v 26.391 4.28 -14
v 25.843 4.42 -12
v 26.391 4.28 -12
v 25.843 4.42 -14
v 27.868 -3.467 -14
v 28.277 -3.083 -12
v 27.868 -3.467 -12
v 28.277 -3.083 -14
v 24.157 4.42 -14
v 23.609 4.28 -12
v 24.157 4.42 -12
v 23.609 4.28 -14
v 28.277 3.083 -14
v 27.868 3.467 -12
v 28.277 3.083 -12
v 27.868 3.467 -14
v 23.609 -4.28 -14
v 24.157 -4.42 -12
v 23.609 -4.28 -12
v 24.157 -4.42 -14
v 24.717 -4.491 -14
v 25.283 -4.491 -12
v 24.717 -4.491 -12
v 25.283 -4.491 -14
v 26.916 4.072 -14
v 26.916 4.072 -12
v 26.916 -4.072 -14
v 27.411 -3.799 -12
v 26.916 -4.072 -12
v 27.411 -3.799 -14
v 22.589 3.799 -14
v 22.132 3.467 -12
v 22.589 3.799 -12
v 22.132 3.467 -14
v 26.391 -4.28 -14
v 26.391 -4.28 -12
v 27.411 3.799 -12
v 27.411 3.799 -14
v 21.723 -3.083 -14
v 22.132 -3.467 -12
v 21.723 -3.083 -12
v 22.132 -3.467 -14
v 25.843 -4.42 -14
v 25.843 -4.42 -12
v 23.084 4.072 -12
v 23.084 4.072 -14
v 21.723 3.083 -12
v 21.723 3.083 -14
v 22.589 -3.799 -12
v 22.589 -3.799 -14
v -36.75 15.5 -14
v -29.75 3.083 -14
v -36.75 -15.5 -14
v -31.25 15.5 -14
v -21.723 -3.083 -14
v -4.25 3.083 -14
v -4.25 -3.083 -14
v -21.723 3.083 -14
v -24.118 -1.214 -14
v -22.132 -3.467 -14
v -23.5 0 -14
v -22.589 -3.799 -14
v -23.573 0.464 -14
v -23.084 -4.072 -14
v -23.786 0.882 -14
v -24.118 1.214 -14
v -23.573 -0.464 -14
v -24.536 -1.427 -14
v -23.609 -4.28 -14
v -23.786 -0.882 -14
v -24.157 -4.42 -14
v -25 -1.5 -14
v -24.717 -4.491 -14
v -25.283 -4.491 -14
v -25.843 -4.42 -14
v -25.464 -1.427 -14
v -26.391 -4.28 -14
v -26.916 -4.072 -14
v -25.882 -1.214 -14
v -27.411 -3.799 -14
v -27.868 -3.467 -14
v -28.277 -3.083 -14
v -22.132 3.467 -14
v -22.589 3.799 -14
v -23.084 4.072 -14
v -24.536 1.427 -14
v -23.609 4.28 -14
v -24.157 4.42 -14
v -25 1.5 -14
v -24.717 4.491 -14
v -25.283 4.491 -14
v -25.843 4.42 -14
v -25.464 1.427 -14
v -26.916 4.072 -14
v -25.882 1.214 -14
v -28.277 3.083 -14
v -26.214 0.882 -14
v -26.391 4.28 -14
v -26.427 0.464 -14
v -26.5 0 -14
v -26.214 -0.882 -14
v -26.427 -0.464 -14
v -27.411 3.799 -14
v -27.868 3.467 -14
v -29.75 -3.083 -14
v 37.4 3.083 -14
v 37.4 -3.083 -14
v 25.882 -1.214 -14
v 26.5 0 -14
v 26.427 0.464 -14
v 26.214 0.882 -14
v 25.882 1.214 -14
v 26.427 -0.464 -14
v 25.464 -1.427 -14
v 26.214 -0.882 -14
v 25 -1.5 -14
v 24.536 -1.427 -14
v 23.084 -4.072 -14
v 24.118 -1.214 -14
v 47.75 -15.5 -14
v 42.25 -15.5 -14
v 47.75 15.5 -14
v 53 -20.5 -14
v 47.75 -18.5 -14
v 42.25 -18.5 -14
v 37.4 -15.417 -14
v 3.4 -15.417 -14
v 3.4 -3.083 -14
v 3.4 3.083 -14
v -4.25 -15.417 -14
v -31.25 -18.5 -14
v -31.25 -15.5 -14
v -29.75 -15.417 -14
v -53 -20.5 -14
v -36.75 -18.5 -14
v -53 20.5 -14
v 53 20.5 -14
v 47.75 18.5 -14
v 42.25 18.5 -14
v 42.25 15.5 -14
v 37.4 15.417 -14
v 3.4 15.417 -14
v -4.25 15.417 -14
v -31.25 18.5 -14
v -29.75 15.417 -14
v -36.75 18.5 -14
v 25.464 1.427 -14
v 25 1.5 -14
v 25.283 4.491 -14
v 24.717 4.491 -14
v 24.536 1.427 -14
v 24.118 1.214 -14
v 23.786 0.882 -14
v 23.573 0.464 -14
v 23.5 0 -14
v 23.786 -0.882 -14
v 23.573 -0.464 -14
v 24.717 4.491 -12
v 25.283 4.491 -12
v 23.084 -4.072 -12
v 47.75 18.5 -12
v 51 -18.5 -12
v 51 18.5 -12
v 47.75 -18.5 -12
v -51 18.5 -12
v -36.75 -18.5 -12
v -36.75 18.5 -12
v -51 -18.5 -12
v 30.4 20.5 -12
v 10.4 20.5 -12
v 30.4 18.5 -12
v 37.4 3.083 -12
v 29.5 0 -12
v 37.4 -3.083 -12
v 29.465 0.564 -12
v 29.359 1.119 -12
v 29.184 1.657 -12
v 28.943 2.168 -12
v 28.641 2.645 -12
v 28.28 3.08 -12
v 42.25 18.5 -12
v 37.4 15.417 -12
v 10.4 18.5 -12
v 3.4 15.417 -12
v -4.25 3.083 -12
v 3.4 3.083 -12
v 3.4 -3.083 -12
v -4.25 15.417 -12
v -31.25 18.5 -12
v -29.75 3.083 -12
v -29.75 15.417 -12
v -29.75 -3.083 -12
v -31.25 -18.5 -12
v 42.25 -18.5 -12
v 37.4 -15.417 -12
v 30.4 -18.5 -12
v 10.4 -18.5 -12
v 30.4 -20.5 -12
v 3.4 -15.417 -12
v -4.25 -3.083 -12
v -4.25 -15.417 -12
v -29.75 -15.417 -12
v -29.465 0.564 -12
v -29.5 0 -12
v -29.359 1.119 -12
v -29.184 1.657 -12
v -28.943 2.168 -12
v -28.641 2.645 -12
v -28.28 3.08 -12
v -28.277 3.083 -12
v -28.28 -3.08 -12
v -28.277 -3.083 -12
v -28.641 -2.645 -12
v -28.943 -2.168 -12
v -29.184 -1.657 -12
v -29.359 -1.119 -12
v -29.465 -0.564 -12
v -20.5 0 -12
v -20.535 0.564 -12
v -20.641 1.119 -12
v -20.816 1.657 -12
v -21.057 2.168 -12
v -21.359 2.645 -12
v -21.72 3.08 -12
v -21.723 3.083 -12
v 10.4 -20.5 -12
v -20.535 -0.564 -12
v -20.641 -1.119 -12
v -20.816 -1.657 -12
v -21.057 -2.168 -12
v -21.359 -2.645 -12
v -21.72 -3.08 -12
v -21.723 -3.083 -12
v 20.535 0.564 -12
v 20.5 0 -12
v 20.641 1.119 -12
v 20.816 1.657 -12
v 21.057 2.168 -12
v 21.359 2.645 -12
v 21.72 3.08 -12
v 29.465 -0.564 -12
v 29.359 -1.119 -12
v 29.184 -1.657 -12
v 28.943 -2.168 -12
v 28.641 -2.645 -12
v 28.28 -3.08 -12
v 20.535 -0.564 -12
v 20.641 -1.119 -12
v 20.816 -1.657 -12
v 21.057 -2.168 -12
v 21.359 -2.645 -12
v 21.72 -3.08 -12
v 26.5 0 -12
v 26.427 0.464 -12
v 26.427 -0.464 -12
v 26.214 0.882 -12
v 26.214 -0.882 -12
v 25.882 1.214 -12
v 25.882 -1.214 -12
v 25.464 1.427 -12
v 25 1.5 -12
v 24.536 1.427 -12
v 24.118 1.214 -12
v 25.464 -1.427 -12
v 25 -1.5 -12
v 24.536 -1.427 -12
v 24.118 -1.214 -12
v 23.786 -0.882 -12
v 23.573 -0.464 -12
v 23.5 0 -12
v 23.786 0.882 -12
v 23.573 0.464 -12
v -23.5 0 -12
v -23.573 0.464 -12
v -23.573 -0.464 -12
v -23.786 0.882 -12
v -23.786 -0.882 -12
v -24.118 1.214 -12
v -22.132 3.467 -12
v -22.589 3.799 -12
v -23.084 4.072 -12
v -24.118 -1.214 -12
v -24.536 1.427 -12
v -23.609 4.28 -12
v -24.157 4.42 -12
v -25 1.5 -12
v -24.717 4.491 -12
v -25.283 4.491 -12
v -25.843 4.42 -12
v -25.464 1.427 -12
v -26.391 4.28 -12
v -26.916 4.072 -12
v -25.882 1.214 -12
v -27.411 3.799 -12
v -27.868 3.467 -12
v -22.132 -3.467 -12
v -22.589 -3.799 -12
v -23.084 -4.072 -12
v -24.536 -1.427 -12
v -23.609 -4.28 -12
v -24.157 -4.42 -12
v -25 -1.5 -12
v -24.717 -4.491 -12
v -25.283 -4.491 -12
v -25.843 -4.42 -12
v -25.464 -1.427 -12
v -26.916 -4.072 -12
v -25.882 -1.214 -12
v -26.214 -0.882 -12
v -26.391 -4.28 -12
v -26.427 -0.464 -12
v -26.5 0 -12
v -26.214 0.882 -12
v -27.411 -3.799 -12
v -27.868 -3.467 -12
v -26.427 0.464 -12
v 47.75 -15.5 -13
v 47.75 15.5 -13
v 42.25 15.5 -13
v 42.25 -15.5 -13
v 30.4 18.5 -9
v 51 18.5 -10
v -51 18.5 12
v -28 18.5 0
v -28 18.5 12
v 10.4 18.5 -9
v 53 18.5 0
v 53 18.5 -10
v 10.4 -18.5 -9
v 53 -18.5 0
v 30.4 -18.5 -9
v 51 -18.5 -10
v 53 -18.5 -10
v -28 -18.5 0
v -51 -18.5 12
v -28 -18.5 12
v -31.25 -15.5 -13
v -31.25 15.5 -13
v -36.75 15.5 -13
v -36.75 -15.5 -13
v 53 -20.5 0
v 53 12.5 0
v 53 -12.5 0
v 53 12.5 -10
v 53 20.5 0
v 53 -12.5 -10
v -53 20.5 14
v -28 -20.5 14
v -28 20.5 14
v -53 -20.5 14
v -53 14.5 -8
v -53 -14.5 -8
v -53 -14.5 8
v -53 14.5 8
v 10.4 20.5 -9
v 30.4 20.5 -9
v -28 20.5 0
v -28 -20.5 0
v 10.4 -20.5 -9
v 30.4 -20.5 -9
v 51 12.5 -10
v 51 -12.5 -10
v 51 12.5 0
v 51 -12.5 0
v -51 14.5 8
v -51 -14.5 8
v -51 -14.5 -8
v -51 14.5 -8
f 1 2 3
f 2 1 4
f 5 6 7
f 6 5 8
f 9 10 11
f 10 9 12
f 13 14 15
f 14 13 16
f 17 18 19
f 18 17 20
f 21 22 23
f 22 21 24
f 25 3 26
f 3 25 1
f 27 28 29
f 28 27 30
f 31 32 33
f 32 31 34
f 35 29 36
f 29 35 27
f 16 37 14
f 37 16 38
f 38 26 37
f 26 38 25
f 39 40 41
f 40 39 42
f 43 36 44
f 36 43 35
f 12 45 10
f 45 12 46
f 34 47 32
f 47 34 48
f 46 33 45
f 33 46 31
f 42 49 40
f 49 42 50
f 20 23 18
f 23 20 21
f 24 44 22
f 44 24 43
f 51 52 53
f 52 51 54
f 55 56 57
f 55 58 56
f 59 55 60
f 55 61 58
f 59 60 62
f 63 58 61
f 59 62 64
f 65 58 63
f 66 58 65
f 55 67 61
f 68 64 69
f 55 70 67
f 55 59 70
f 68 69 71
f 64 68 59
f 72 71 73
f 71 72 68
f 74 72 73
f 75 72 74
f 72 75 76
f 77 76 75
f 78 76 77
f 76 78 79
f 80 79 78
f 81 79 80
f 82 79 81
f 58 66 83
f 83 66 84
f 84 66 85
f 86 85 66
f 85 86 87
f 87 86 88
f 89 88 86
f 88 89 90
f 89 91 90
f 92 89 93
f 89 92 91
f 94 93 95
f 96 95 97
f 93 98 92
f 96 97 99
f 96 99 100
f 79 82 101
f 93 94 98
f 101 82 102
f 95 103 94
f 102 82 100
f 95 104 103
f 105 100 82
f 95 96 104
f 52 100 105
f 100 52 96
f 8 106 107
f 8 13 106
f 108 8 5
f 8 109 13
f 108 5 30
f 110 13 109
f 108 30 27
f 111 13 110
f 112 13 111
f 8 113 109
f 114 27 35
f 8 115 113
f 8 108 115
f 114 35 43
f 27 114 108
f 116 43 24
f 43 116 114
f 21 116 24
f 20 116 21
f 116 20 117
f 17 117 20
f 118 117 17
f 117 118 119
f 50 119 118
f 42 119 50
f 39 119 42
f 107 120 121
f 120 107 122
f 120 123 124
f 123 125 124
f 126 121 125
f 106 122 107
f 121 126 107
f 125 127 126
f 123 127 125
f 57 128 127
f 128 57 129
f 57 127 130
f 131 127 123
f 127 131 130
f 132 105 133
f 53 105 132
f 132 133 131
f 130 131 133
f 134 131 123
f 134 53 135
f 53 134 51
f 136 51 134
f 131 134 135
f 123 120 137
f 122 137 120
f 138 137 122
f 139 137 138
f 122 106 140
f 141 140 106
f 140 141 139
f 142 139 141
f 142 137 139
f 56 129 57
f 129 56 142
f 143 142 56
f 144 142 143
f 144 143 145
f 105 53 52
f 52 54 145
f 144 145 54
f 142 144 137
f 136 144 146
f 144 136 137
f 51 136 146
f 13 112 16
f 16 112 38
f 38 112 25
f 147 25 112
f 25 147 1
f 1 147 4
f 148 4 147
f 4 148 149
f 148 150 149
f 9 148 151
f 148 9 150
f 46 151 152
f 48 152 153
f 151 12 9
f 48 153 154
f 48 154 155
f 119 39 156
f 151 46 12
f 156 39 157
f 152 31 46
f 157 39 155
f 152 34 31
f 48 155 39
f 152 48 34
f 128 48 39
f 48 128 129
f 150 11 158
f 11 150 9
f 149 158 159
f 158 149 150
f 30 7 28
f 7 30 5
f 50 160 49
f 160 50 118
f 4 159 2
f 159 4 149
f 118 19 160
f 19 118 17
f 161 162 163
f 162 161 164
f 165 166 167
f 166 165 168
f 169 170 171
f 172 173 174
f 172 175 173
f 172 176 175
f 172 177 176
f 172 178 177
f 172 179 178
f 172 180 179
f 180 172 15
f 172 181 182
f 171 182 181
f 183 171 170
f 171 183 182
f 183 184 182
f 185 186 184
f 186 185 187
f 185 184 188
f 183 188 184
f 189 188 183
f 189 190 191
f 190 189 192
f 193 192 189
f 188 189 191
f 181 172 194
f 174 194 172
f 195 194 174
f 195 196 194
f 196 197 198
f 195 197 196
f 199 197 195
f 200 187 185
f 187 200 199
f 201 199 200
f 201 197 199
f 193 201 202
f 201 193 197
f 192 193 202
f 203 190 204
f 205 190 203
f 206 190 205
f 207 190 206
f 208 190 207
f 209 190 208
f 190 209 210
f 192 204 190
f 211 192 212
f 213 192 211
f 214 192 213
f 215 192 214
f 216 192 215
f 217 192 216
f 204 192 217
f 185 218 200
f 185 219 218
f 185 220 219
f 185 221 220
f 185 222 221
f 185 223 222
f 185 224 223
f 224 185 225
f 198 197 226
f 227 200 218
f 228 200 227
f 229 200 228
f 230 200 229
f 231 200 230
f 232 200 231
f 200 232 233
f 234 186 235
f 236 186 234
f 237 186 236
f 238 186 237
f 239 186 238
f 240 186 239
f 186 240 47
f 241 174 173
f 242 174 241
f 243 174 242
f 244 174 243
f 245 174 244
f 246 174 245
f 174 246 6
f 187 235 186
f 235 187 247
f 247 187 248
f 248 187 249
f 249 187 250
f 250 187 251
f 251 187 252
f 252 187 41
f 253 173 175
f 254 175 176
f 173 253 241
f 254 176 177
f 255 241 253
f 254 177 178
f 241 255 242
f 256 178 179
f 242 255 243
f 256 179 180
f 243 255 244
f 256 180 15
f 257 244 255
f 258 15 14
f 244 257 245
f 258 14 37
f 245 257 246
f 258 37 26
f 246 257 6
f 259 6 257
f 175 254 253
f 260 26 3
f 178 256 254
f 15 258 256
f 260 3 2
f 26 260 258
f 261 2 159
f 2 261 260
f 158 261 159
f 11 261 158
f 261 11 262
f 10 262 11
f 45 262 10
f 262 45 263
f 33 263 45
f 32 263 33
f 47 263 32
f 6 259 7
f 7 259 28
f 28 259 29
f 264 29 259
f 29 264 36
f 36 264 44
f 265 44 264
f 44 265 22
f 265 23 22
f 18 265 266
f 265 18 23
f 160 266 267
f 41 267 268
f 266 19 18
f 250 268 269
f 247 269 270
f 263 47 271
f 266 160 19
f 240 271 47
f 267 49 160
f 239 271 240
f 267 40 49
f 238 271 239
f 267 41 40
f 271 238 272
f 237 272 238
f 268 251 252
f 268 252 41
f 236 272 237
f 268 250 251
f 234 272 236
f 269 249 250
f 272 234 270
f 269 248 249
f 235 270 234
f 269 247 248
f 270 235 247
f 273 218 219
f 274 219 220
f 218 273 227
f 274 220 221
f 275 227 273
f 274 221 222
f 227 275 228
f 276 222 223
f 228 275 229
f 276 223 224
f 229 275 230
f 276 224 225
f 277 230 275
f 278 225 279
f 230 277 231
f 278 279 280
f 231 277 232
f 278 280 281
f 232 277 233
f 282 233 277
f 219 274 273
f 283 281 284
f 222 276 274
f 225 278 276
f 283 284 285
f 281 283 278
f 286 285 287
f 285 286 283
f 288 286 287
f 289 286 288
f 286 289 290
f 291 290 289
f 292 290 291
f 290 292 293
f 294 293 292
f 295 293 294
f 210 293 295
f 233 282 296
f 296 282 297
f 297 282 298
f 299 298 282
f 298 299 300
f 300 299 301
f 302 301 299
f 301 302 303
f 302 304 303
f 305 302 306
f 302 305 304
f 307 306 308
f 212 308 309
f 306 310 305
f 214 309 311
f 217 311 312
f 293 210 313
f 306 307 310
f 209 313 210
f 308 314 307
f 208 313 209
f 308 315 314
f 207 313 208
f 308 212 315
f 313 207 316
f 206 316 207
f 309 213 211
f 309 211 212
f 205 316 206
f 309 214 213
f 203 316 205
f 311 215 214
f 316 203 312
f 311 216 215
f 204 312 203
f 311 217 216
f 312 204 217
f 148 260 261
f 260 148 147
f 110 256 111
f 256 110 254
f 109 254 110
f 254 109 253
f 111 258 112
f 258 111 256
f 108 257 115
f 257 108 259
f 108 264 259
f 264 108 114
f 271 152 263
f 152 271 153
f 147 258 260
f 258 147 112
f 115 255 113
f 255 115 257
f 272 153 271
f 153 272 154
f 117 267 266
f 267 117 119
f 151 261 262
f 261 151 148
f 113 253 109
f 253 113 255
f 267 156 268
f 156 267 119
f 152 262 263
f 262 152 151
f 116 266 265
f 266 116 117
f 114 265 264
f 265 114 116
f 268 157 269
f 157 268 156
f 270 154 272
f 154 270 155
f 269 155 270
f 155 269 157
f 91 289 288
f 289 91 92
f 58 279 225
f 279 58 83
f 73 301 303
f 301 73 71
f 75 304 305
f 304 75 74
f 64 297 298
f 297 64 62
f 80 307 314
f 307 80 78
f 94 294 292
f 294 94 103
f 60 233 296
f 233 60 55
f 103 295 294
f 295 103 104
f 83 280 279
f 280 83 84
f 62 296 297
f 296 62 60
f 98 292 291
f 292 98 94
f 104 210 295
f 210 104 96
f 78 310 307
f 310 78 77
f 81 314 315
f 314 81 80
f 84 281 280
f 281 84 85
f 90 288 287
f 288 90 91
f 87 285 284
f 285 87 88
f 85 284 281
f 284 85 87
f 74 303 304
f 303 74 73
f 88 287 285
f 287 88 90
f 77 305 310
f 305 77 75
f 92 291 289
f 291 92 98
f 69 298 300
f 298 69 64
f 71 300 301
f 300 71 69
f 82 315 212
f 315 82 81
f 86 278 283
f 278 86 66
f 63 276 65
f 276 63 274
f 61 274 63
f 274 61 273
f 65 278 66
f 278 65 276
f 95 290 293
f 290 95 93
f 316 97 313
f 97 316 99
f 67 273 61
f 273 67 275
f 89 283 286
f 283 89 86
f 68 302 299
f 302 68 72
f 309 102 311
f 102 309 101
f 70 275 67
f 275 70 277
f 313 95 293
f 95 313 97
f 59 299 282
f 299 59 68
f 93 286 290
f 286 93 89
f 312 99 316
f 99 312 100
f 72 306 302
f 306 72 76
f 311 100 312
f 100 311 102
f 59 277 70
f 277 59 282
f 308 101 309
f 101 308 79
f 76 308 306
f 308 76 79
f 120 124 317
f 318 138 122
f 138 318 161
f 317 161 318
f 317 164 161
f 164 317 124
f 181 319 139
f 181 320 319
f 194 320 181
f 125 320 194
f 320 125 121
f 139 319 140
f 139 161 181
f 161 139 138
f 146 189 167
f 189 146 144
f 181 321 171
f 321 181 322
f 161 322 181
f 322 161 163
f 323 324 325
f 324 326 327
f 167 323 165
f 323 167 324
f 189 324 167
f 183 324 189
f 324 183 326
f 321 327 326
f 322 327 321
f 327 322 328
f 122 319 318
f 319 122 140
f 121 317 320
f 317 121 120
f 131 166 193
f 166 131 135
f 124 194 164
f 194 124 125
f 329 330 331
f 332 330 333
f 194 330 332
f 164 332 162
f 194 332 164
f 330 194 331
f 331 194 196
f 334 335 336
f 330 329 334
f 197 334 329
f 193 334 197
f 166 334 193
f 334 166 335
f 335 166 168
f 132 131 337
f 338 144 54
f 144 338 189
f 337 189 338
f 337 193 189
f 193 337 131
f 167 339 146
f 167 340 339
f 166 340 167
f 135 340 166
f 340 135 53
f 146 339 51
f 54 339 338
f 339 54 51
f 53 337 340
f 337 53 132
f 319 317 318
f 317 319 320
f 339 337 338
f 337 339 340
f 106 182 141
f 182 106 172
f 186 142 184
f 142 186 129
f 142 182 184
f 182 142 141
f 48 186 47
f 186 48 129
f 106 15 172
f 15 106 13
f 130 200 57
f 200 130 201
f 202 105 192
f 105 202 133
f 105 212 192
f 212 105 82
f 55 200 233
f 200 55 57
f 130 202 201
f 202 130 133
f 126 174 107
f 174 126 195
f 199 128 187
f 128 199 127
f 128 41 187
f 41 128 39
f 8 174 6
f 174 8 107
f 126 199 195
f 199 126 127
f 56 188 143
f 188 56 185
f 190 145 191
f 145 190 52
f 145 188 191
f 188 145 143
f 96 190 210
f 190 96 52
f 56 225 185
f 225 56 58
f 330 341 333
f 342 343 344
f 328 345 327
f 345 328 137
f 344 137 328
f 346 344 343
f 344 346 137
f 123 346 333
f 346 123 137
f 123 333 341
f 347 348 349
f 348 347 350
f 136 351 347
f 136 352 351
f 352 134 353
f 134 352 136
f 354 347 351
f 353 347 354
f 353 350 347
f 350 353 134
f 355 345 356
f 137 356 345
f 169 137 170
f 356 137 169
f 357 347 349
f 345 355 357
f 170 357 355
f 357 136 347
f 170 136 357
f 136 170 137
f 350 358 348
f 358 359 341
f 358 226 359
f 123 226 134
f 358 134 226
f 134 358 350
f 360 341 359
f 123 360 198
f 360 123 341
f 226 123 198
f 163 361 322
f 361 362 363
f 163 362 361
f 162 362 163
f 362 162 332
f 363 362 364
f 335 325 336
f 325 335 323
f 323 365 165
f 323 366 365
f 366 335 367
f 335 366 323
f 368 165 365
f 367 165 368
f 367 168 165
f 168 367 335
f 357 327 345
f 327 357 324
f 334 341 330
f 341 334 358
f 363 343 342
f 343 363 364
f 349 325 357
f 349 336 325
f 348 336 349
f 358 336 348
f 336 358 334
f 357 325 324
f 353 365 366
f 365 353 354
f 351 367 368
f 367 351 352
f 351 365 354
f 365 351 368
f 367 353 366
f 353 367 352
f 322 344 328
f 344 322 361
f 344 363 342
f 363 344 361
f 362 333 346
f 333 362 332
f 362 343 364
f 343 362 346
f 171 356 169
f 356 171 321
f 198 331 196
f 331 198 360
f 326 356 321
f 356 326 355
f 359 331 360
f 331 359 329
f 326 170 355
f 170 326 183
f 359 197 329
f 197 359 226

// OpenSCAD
battery_length=102;
battery_height=24;
battery_width=37;
// high is not be tested it can be it will not fit in!
wall_height=2; // [3:low,2:medium,1.5:!high!]
thickness=2; // [1:3]
hole= 3; // [0:8]
sunk_screws=0; // [0:NO, 1:YES]
// set this to 0 for one hole.
hole_distance=50;
light=1; // [0:NO, 1:YES]
cable_tie_hole=1;// [0:NO, 1:YES]
band_hole=1; // [0:NO, 1:YES]
thick_edge=0; // [0:NO, 1:YES]
//This will only disable wall height and band hole!
hard_case=0; // [0:NO, 1:YES]

module Akku(){
cube([battery_length,battery_width,battery_height],center=true);
}


module Case(L,B,H)
{
difference(){
cube([L,B,H],center=true);
Akku();

if (hard_case==0)
{
if(battery_length > 100)
{
translate([25,0,thickness+battery_height/wall_height]){
cube([L,B+0.5,H],center=true);
}
} else {
translate([battery_length/4,0,thickness+battery_height/wall_height]){
cube([L,B+0.5,H],center=true);
}
}
}

if(light==1)
{
translate([-L/2,0,0])
{
cube([L,battery_width-thickness*4,battery_height-thickness*4],center=true);
}
}



if (hard_case==1)
{
translate([L/2,0,0])
{
cube([L,battery_width,battery_height],center=true);
}
}
translate([L/2,battery_width/2-thickness*1.5,0])
{
cube([L,thickness*3,battery_height-thickness*2],center=true);
}
translate([L/2,-battery_width/2+thickness*1.5,0])
{
cube([L,thickness*3,battery_height-thickness*2],center=true);
}



if(cable_tie_hole==1)
{
translate([battery_length/2-thickness*3,battery_width/2-1.5,-battery_height/2-0.1])
{
cube([5.5,3,thickness*2],center=true);
}
translate([battery_length/2-thickness*3,-battery_width/2+1.5,-battery_height/2-0.1])
{
cube([5.5,3,thickness*2],center=true);
}
translate([-battery_length/3,battery_width/2-1.5,-battery_height/2-0.1])
{
cube([5.5,3,thickness*2],center=true);
}
translate([-battery_length/3,-battery_width/2+1.5,-battery_height/2-0.1])
{
cube([5.5,3,thickness*2],center=true);
}

translate([battery_length/2-thickness*3,0,-battery_height/2])
{
cube([5.5,battery_width,thickness],center=true);
}
translate([-battery_length/3,0,-battery_height/2])
{
cube([5.5,battery_width,thickness],center=true);
}
}





if(thick_edge==1)
{
if(battery_length/5 > 20)
{
translate([battery_length,battery_width/2,0])
{
cube([battery_length+20,thickness*3,battery_height-thickness*2],center=true);
}
translate([battery_length,-battery_width/2,0])
{
cube([battery_length+20,thickness*3,battery_height-thickness*2],center=true);
}
} else{
translate([battery_length,battery_width/2,0])
{
cube([battery_length+battery_length/5,thickness*3,battery_height-thickness*2],center=true);
}
translate([battery_length,-battery_width/2,0])
{
cube([battery_length+battery_length/5,thickness*3,battery_height-thickness*2],center=true);
}
}
}




if (hard_case==0)
{
if(band_hole==1)
{
translate([battery_length/5,0,-battery_height/2+1.5])
{
if(battery_length > 60)
{
cube([20,battery_width+thickness*2+1,3],center=true);
} else {
cube([battery_length/3,battery_width+thickness*2+1,3],center=true);
}
}
}
}

if (hard_case==1)
{
translate([battery_length/2-thickness*3,0,0])
{
cube([3,20,battery_height+20],center=true);
}
}


if(light==1)
{
translate([battery_length/5,battery_width/4,-battery_height/2-0.1])
{
cube([battery_length/3,battery_width/3,thickness*2],center=true);
}
translate([-battery_length/6,-battery_width/4,-battery_height/2-0.1])
{
cube([battery_length/4,battery_width/3,thickness*2],center=true);
}
translate([battery_length/5,-battery_width/4,-battery_height/2-0.1])
{
cube([battery_length/3,battery_width/3,thickness*2],center=true);
}
translate([-battery_length/6,battery_width/4,-battery_height/2-0.1])
{
cube([battery_length/4,battery_width/3,thickness*2],center=true);
}
}


translate([hole_distance/2,0,-battery_height/2-thickness-0.1])
{
cylinder(d=hole,h=thickness+0.5,$fn=20);
}
if(sunk_screws==1)
{
translate([hole_distance/2,0,-battery_height/2-hole/2])
{
cylinder(d1=hole,d2=hole*2,h=hole/2,$fn=20);
}
}
translate([-hole_distance/2,0,-battery_height/2-thickness-0.1])
{
cylinder(d=hole,h=thickness+0.5,$fn=20);
}
if(sunk_screws==1)
{
translate([-hole_distance/2,0,-battery_height/2-hole/2])
{
cylinder(d1=hole,d2=hole*2,h=hole/2,$fn=20);
}
}
}
}


if(hole!=0)
{
difference(){
translate([hole_distance/2,0,-battery_height/2-thickness])
{
cylinder(d=hole+6,h=thickness,$fn=50);
}
translate([hole_distance/2,0,-battery_height/2-thickness-0.1])
{
cylinder(d=hole,h=thickness+0.5,$fn=20);
}
translate([battery_length/2-thickness*3,0,-battery_height/2])
{
cube([5.5,battery_width,thickness],center=true);
}
if(sunk_screws==1)
{
translate([hole_distance/2,0,-battery_height/2-hole/2])
{
cylinder(d1=hole,d2=hole*2,h=hole/2,$fn=20);
}
}
}


difference(){
translate([-hole_distance/2,0,-battery_height/2-thickness])
{
cylinder(d=hole+6,h=thickness,$fn=50);
}
translate([-hole_distance/2,0,-battery_height/2-thickness-0.1])
{
cylinder(d=hole,h=thickness+0.5,$fn=20);
}
translate([-battery_length/3,0,-battery_height/2])
{
cube([5.5,battery_width,thickness],center=true);
}
if(sunk_screws==1)
{
translate([-hole_distance/2,0,-battery_height/2-hole/2])
{
cylinder(d1=hole,d2=hole*2,h=hole/2,$fn=20);
}
}
}
}



Case(battery_length+thickness*2,battery_width+thickness*2,battery_height+thickness*2); 
